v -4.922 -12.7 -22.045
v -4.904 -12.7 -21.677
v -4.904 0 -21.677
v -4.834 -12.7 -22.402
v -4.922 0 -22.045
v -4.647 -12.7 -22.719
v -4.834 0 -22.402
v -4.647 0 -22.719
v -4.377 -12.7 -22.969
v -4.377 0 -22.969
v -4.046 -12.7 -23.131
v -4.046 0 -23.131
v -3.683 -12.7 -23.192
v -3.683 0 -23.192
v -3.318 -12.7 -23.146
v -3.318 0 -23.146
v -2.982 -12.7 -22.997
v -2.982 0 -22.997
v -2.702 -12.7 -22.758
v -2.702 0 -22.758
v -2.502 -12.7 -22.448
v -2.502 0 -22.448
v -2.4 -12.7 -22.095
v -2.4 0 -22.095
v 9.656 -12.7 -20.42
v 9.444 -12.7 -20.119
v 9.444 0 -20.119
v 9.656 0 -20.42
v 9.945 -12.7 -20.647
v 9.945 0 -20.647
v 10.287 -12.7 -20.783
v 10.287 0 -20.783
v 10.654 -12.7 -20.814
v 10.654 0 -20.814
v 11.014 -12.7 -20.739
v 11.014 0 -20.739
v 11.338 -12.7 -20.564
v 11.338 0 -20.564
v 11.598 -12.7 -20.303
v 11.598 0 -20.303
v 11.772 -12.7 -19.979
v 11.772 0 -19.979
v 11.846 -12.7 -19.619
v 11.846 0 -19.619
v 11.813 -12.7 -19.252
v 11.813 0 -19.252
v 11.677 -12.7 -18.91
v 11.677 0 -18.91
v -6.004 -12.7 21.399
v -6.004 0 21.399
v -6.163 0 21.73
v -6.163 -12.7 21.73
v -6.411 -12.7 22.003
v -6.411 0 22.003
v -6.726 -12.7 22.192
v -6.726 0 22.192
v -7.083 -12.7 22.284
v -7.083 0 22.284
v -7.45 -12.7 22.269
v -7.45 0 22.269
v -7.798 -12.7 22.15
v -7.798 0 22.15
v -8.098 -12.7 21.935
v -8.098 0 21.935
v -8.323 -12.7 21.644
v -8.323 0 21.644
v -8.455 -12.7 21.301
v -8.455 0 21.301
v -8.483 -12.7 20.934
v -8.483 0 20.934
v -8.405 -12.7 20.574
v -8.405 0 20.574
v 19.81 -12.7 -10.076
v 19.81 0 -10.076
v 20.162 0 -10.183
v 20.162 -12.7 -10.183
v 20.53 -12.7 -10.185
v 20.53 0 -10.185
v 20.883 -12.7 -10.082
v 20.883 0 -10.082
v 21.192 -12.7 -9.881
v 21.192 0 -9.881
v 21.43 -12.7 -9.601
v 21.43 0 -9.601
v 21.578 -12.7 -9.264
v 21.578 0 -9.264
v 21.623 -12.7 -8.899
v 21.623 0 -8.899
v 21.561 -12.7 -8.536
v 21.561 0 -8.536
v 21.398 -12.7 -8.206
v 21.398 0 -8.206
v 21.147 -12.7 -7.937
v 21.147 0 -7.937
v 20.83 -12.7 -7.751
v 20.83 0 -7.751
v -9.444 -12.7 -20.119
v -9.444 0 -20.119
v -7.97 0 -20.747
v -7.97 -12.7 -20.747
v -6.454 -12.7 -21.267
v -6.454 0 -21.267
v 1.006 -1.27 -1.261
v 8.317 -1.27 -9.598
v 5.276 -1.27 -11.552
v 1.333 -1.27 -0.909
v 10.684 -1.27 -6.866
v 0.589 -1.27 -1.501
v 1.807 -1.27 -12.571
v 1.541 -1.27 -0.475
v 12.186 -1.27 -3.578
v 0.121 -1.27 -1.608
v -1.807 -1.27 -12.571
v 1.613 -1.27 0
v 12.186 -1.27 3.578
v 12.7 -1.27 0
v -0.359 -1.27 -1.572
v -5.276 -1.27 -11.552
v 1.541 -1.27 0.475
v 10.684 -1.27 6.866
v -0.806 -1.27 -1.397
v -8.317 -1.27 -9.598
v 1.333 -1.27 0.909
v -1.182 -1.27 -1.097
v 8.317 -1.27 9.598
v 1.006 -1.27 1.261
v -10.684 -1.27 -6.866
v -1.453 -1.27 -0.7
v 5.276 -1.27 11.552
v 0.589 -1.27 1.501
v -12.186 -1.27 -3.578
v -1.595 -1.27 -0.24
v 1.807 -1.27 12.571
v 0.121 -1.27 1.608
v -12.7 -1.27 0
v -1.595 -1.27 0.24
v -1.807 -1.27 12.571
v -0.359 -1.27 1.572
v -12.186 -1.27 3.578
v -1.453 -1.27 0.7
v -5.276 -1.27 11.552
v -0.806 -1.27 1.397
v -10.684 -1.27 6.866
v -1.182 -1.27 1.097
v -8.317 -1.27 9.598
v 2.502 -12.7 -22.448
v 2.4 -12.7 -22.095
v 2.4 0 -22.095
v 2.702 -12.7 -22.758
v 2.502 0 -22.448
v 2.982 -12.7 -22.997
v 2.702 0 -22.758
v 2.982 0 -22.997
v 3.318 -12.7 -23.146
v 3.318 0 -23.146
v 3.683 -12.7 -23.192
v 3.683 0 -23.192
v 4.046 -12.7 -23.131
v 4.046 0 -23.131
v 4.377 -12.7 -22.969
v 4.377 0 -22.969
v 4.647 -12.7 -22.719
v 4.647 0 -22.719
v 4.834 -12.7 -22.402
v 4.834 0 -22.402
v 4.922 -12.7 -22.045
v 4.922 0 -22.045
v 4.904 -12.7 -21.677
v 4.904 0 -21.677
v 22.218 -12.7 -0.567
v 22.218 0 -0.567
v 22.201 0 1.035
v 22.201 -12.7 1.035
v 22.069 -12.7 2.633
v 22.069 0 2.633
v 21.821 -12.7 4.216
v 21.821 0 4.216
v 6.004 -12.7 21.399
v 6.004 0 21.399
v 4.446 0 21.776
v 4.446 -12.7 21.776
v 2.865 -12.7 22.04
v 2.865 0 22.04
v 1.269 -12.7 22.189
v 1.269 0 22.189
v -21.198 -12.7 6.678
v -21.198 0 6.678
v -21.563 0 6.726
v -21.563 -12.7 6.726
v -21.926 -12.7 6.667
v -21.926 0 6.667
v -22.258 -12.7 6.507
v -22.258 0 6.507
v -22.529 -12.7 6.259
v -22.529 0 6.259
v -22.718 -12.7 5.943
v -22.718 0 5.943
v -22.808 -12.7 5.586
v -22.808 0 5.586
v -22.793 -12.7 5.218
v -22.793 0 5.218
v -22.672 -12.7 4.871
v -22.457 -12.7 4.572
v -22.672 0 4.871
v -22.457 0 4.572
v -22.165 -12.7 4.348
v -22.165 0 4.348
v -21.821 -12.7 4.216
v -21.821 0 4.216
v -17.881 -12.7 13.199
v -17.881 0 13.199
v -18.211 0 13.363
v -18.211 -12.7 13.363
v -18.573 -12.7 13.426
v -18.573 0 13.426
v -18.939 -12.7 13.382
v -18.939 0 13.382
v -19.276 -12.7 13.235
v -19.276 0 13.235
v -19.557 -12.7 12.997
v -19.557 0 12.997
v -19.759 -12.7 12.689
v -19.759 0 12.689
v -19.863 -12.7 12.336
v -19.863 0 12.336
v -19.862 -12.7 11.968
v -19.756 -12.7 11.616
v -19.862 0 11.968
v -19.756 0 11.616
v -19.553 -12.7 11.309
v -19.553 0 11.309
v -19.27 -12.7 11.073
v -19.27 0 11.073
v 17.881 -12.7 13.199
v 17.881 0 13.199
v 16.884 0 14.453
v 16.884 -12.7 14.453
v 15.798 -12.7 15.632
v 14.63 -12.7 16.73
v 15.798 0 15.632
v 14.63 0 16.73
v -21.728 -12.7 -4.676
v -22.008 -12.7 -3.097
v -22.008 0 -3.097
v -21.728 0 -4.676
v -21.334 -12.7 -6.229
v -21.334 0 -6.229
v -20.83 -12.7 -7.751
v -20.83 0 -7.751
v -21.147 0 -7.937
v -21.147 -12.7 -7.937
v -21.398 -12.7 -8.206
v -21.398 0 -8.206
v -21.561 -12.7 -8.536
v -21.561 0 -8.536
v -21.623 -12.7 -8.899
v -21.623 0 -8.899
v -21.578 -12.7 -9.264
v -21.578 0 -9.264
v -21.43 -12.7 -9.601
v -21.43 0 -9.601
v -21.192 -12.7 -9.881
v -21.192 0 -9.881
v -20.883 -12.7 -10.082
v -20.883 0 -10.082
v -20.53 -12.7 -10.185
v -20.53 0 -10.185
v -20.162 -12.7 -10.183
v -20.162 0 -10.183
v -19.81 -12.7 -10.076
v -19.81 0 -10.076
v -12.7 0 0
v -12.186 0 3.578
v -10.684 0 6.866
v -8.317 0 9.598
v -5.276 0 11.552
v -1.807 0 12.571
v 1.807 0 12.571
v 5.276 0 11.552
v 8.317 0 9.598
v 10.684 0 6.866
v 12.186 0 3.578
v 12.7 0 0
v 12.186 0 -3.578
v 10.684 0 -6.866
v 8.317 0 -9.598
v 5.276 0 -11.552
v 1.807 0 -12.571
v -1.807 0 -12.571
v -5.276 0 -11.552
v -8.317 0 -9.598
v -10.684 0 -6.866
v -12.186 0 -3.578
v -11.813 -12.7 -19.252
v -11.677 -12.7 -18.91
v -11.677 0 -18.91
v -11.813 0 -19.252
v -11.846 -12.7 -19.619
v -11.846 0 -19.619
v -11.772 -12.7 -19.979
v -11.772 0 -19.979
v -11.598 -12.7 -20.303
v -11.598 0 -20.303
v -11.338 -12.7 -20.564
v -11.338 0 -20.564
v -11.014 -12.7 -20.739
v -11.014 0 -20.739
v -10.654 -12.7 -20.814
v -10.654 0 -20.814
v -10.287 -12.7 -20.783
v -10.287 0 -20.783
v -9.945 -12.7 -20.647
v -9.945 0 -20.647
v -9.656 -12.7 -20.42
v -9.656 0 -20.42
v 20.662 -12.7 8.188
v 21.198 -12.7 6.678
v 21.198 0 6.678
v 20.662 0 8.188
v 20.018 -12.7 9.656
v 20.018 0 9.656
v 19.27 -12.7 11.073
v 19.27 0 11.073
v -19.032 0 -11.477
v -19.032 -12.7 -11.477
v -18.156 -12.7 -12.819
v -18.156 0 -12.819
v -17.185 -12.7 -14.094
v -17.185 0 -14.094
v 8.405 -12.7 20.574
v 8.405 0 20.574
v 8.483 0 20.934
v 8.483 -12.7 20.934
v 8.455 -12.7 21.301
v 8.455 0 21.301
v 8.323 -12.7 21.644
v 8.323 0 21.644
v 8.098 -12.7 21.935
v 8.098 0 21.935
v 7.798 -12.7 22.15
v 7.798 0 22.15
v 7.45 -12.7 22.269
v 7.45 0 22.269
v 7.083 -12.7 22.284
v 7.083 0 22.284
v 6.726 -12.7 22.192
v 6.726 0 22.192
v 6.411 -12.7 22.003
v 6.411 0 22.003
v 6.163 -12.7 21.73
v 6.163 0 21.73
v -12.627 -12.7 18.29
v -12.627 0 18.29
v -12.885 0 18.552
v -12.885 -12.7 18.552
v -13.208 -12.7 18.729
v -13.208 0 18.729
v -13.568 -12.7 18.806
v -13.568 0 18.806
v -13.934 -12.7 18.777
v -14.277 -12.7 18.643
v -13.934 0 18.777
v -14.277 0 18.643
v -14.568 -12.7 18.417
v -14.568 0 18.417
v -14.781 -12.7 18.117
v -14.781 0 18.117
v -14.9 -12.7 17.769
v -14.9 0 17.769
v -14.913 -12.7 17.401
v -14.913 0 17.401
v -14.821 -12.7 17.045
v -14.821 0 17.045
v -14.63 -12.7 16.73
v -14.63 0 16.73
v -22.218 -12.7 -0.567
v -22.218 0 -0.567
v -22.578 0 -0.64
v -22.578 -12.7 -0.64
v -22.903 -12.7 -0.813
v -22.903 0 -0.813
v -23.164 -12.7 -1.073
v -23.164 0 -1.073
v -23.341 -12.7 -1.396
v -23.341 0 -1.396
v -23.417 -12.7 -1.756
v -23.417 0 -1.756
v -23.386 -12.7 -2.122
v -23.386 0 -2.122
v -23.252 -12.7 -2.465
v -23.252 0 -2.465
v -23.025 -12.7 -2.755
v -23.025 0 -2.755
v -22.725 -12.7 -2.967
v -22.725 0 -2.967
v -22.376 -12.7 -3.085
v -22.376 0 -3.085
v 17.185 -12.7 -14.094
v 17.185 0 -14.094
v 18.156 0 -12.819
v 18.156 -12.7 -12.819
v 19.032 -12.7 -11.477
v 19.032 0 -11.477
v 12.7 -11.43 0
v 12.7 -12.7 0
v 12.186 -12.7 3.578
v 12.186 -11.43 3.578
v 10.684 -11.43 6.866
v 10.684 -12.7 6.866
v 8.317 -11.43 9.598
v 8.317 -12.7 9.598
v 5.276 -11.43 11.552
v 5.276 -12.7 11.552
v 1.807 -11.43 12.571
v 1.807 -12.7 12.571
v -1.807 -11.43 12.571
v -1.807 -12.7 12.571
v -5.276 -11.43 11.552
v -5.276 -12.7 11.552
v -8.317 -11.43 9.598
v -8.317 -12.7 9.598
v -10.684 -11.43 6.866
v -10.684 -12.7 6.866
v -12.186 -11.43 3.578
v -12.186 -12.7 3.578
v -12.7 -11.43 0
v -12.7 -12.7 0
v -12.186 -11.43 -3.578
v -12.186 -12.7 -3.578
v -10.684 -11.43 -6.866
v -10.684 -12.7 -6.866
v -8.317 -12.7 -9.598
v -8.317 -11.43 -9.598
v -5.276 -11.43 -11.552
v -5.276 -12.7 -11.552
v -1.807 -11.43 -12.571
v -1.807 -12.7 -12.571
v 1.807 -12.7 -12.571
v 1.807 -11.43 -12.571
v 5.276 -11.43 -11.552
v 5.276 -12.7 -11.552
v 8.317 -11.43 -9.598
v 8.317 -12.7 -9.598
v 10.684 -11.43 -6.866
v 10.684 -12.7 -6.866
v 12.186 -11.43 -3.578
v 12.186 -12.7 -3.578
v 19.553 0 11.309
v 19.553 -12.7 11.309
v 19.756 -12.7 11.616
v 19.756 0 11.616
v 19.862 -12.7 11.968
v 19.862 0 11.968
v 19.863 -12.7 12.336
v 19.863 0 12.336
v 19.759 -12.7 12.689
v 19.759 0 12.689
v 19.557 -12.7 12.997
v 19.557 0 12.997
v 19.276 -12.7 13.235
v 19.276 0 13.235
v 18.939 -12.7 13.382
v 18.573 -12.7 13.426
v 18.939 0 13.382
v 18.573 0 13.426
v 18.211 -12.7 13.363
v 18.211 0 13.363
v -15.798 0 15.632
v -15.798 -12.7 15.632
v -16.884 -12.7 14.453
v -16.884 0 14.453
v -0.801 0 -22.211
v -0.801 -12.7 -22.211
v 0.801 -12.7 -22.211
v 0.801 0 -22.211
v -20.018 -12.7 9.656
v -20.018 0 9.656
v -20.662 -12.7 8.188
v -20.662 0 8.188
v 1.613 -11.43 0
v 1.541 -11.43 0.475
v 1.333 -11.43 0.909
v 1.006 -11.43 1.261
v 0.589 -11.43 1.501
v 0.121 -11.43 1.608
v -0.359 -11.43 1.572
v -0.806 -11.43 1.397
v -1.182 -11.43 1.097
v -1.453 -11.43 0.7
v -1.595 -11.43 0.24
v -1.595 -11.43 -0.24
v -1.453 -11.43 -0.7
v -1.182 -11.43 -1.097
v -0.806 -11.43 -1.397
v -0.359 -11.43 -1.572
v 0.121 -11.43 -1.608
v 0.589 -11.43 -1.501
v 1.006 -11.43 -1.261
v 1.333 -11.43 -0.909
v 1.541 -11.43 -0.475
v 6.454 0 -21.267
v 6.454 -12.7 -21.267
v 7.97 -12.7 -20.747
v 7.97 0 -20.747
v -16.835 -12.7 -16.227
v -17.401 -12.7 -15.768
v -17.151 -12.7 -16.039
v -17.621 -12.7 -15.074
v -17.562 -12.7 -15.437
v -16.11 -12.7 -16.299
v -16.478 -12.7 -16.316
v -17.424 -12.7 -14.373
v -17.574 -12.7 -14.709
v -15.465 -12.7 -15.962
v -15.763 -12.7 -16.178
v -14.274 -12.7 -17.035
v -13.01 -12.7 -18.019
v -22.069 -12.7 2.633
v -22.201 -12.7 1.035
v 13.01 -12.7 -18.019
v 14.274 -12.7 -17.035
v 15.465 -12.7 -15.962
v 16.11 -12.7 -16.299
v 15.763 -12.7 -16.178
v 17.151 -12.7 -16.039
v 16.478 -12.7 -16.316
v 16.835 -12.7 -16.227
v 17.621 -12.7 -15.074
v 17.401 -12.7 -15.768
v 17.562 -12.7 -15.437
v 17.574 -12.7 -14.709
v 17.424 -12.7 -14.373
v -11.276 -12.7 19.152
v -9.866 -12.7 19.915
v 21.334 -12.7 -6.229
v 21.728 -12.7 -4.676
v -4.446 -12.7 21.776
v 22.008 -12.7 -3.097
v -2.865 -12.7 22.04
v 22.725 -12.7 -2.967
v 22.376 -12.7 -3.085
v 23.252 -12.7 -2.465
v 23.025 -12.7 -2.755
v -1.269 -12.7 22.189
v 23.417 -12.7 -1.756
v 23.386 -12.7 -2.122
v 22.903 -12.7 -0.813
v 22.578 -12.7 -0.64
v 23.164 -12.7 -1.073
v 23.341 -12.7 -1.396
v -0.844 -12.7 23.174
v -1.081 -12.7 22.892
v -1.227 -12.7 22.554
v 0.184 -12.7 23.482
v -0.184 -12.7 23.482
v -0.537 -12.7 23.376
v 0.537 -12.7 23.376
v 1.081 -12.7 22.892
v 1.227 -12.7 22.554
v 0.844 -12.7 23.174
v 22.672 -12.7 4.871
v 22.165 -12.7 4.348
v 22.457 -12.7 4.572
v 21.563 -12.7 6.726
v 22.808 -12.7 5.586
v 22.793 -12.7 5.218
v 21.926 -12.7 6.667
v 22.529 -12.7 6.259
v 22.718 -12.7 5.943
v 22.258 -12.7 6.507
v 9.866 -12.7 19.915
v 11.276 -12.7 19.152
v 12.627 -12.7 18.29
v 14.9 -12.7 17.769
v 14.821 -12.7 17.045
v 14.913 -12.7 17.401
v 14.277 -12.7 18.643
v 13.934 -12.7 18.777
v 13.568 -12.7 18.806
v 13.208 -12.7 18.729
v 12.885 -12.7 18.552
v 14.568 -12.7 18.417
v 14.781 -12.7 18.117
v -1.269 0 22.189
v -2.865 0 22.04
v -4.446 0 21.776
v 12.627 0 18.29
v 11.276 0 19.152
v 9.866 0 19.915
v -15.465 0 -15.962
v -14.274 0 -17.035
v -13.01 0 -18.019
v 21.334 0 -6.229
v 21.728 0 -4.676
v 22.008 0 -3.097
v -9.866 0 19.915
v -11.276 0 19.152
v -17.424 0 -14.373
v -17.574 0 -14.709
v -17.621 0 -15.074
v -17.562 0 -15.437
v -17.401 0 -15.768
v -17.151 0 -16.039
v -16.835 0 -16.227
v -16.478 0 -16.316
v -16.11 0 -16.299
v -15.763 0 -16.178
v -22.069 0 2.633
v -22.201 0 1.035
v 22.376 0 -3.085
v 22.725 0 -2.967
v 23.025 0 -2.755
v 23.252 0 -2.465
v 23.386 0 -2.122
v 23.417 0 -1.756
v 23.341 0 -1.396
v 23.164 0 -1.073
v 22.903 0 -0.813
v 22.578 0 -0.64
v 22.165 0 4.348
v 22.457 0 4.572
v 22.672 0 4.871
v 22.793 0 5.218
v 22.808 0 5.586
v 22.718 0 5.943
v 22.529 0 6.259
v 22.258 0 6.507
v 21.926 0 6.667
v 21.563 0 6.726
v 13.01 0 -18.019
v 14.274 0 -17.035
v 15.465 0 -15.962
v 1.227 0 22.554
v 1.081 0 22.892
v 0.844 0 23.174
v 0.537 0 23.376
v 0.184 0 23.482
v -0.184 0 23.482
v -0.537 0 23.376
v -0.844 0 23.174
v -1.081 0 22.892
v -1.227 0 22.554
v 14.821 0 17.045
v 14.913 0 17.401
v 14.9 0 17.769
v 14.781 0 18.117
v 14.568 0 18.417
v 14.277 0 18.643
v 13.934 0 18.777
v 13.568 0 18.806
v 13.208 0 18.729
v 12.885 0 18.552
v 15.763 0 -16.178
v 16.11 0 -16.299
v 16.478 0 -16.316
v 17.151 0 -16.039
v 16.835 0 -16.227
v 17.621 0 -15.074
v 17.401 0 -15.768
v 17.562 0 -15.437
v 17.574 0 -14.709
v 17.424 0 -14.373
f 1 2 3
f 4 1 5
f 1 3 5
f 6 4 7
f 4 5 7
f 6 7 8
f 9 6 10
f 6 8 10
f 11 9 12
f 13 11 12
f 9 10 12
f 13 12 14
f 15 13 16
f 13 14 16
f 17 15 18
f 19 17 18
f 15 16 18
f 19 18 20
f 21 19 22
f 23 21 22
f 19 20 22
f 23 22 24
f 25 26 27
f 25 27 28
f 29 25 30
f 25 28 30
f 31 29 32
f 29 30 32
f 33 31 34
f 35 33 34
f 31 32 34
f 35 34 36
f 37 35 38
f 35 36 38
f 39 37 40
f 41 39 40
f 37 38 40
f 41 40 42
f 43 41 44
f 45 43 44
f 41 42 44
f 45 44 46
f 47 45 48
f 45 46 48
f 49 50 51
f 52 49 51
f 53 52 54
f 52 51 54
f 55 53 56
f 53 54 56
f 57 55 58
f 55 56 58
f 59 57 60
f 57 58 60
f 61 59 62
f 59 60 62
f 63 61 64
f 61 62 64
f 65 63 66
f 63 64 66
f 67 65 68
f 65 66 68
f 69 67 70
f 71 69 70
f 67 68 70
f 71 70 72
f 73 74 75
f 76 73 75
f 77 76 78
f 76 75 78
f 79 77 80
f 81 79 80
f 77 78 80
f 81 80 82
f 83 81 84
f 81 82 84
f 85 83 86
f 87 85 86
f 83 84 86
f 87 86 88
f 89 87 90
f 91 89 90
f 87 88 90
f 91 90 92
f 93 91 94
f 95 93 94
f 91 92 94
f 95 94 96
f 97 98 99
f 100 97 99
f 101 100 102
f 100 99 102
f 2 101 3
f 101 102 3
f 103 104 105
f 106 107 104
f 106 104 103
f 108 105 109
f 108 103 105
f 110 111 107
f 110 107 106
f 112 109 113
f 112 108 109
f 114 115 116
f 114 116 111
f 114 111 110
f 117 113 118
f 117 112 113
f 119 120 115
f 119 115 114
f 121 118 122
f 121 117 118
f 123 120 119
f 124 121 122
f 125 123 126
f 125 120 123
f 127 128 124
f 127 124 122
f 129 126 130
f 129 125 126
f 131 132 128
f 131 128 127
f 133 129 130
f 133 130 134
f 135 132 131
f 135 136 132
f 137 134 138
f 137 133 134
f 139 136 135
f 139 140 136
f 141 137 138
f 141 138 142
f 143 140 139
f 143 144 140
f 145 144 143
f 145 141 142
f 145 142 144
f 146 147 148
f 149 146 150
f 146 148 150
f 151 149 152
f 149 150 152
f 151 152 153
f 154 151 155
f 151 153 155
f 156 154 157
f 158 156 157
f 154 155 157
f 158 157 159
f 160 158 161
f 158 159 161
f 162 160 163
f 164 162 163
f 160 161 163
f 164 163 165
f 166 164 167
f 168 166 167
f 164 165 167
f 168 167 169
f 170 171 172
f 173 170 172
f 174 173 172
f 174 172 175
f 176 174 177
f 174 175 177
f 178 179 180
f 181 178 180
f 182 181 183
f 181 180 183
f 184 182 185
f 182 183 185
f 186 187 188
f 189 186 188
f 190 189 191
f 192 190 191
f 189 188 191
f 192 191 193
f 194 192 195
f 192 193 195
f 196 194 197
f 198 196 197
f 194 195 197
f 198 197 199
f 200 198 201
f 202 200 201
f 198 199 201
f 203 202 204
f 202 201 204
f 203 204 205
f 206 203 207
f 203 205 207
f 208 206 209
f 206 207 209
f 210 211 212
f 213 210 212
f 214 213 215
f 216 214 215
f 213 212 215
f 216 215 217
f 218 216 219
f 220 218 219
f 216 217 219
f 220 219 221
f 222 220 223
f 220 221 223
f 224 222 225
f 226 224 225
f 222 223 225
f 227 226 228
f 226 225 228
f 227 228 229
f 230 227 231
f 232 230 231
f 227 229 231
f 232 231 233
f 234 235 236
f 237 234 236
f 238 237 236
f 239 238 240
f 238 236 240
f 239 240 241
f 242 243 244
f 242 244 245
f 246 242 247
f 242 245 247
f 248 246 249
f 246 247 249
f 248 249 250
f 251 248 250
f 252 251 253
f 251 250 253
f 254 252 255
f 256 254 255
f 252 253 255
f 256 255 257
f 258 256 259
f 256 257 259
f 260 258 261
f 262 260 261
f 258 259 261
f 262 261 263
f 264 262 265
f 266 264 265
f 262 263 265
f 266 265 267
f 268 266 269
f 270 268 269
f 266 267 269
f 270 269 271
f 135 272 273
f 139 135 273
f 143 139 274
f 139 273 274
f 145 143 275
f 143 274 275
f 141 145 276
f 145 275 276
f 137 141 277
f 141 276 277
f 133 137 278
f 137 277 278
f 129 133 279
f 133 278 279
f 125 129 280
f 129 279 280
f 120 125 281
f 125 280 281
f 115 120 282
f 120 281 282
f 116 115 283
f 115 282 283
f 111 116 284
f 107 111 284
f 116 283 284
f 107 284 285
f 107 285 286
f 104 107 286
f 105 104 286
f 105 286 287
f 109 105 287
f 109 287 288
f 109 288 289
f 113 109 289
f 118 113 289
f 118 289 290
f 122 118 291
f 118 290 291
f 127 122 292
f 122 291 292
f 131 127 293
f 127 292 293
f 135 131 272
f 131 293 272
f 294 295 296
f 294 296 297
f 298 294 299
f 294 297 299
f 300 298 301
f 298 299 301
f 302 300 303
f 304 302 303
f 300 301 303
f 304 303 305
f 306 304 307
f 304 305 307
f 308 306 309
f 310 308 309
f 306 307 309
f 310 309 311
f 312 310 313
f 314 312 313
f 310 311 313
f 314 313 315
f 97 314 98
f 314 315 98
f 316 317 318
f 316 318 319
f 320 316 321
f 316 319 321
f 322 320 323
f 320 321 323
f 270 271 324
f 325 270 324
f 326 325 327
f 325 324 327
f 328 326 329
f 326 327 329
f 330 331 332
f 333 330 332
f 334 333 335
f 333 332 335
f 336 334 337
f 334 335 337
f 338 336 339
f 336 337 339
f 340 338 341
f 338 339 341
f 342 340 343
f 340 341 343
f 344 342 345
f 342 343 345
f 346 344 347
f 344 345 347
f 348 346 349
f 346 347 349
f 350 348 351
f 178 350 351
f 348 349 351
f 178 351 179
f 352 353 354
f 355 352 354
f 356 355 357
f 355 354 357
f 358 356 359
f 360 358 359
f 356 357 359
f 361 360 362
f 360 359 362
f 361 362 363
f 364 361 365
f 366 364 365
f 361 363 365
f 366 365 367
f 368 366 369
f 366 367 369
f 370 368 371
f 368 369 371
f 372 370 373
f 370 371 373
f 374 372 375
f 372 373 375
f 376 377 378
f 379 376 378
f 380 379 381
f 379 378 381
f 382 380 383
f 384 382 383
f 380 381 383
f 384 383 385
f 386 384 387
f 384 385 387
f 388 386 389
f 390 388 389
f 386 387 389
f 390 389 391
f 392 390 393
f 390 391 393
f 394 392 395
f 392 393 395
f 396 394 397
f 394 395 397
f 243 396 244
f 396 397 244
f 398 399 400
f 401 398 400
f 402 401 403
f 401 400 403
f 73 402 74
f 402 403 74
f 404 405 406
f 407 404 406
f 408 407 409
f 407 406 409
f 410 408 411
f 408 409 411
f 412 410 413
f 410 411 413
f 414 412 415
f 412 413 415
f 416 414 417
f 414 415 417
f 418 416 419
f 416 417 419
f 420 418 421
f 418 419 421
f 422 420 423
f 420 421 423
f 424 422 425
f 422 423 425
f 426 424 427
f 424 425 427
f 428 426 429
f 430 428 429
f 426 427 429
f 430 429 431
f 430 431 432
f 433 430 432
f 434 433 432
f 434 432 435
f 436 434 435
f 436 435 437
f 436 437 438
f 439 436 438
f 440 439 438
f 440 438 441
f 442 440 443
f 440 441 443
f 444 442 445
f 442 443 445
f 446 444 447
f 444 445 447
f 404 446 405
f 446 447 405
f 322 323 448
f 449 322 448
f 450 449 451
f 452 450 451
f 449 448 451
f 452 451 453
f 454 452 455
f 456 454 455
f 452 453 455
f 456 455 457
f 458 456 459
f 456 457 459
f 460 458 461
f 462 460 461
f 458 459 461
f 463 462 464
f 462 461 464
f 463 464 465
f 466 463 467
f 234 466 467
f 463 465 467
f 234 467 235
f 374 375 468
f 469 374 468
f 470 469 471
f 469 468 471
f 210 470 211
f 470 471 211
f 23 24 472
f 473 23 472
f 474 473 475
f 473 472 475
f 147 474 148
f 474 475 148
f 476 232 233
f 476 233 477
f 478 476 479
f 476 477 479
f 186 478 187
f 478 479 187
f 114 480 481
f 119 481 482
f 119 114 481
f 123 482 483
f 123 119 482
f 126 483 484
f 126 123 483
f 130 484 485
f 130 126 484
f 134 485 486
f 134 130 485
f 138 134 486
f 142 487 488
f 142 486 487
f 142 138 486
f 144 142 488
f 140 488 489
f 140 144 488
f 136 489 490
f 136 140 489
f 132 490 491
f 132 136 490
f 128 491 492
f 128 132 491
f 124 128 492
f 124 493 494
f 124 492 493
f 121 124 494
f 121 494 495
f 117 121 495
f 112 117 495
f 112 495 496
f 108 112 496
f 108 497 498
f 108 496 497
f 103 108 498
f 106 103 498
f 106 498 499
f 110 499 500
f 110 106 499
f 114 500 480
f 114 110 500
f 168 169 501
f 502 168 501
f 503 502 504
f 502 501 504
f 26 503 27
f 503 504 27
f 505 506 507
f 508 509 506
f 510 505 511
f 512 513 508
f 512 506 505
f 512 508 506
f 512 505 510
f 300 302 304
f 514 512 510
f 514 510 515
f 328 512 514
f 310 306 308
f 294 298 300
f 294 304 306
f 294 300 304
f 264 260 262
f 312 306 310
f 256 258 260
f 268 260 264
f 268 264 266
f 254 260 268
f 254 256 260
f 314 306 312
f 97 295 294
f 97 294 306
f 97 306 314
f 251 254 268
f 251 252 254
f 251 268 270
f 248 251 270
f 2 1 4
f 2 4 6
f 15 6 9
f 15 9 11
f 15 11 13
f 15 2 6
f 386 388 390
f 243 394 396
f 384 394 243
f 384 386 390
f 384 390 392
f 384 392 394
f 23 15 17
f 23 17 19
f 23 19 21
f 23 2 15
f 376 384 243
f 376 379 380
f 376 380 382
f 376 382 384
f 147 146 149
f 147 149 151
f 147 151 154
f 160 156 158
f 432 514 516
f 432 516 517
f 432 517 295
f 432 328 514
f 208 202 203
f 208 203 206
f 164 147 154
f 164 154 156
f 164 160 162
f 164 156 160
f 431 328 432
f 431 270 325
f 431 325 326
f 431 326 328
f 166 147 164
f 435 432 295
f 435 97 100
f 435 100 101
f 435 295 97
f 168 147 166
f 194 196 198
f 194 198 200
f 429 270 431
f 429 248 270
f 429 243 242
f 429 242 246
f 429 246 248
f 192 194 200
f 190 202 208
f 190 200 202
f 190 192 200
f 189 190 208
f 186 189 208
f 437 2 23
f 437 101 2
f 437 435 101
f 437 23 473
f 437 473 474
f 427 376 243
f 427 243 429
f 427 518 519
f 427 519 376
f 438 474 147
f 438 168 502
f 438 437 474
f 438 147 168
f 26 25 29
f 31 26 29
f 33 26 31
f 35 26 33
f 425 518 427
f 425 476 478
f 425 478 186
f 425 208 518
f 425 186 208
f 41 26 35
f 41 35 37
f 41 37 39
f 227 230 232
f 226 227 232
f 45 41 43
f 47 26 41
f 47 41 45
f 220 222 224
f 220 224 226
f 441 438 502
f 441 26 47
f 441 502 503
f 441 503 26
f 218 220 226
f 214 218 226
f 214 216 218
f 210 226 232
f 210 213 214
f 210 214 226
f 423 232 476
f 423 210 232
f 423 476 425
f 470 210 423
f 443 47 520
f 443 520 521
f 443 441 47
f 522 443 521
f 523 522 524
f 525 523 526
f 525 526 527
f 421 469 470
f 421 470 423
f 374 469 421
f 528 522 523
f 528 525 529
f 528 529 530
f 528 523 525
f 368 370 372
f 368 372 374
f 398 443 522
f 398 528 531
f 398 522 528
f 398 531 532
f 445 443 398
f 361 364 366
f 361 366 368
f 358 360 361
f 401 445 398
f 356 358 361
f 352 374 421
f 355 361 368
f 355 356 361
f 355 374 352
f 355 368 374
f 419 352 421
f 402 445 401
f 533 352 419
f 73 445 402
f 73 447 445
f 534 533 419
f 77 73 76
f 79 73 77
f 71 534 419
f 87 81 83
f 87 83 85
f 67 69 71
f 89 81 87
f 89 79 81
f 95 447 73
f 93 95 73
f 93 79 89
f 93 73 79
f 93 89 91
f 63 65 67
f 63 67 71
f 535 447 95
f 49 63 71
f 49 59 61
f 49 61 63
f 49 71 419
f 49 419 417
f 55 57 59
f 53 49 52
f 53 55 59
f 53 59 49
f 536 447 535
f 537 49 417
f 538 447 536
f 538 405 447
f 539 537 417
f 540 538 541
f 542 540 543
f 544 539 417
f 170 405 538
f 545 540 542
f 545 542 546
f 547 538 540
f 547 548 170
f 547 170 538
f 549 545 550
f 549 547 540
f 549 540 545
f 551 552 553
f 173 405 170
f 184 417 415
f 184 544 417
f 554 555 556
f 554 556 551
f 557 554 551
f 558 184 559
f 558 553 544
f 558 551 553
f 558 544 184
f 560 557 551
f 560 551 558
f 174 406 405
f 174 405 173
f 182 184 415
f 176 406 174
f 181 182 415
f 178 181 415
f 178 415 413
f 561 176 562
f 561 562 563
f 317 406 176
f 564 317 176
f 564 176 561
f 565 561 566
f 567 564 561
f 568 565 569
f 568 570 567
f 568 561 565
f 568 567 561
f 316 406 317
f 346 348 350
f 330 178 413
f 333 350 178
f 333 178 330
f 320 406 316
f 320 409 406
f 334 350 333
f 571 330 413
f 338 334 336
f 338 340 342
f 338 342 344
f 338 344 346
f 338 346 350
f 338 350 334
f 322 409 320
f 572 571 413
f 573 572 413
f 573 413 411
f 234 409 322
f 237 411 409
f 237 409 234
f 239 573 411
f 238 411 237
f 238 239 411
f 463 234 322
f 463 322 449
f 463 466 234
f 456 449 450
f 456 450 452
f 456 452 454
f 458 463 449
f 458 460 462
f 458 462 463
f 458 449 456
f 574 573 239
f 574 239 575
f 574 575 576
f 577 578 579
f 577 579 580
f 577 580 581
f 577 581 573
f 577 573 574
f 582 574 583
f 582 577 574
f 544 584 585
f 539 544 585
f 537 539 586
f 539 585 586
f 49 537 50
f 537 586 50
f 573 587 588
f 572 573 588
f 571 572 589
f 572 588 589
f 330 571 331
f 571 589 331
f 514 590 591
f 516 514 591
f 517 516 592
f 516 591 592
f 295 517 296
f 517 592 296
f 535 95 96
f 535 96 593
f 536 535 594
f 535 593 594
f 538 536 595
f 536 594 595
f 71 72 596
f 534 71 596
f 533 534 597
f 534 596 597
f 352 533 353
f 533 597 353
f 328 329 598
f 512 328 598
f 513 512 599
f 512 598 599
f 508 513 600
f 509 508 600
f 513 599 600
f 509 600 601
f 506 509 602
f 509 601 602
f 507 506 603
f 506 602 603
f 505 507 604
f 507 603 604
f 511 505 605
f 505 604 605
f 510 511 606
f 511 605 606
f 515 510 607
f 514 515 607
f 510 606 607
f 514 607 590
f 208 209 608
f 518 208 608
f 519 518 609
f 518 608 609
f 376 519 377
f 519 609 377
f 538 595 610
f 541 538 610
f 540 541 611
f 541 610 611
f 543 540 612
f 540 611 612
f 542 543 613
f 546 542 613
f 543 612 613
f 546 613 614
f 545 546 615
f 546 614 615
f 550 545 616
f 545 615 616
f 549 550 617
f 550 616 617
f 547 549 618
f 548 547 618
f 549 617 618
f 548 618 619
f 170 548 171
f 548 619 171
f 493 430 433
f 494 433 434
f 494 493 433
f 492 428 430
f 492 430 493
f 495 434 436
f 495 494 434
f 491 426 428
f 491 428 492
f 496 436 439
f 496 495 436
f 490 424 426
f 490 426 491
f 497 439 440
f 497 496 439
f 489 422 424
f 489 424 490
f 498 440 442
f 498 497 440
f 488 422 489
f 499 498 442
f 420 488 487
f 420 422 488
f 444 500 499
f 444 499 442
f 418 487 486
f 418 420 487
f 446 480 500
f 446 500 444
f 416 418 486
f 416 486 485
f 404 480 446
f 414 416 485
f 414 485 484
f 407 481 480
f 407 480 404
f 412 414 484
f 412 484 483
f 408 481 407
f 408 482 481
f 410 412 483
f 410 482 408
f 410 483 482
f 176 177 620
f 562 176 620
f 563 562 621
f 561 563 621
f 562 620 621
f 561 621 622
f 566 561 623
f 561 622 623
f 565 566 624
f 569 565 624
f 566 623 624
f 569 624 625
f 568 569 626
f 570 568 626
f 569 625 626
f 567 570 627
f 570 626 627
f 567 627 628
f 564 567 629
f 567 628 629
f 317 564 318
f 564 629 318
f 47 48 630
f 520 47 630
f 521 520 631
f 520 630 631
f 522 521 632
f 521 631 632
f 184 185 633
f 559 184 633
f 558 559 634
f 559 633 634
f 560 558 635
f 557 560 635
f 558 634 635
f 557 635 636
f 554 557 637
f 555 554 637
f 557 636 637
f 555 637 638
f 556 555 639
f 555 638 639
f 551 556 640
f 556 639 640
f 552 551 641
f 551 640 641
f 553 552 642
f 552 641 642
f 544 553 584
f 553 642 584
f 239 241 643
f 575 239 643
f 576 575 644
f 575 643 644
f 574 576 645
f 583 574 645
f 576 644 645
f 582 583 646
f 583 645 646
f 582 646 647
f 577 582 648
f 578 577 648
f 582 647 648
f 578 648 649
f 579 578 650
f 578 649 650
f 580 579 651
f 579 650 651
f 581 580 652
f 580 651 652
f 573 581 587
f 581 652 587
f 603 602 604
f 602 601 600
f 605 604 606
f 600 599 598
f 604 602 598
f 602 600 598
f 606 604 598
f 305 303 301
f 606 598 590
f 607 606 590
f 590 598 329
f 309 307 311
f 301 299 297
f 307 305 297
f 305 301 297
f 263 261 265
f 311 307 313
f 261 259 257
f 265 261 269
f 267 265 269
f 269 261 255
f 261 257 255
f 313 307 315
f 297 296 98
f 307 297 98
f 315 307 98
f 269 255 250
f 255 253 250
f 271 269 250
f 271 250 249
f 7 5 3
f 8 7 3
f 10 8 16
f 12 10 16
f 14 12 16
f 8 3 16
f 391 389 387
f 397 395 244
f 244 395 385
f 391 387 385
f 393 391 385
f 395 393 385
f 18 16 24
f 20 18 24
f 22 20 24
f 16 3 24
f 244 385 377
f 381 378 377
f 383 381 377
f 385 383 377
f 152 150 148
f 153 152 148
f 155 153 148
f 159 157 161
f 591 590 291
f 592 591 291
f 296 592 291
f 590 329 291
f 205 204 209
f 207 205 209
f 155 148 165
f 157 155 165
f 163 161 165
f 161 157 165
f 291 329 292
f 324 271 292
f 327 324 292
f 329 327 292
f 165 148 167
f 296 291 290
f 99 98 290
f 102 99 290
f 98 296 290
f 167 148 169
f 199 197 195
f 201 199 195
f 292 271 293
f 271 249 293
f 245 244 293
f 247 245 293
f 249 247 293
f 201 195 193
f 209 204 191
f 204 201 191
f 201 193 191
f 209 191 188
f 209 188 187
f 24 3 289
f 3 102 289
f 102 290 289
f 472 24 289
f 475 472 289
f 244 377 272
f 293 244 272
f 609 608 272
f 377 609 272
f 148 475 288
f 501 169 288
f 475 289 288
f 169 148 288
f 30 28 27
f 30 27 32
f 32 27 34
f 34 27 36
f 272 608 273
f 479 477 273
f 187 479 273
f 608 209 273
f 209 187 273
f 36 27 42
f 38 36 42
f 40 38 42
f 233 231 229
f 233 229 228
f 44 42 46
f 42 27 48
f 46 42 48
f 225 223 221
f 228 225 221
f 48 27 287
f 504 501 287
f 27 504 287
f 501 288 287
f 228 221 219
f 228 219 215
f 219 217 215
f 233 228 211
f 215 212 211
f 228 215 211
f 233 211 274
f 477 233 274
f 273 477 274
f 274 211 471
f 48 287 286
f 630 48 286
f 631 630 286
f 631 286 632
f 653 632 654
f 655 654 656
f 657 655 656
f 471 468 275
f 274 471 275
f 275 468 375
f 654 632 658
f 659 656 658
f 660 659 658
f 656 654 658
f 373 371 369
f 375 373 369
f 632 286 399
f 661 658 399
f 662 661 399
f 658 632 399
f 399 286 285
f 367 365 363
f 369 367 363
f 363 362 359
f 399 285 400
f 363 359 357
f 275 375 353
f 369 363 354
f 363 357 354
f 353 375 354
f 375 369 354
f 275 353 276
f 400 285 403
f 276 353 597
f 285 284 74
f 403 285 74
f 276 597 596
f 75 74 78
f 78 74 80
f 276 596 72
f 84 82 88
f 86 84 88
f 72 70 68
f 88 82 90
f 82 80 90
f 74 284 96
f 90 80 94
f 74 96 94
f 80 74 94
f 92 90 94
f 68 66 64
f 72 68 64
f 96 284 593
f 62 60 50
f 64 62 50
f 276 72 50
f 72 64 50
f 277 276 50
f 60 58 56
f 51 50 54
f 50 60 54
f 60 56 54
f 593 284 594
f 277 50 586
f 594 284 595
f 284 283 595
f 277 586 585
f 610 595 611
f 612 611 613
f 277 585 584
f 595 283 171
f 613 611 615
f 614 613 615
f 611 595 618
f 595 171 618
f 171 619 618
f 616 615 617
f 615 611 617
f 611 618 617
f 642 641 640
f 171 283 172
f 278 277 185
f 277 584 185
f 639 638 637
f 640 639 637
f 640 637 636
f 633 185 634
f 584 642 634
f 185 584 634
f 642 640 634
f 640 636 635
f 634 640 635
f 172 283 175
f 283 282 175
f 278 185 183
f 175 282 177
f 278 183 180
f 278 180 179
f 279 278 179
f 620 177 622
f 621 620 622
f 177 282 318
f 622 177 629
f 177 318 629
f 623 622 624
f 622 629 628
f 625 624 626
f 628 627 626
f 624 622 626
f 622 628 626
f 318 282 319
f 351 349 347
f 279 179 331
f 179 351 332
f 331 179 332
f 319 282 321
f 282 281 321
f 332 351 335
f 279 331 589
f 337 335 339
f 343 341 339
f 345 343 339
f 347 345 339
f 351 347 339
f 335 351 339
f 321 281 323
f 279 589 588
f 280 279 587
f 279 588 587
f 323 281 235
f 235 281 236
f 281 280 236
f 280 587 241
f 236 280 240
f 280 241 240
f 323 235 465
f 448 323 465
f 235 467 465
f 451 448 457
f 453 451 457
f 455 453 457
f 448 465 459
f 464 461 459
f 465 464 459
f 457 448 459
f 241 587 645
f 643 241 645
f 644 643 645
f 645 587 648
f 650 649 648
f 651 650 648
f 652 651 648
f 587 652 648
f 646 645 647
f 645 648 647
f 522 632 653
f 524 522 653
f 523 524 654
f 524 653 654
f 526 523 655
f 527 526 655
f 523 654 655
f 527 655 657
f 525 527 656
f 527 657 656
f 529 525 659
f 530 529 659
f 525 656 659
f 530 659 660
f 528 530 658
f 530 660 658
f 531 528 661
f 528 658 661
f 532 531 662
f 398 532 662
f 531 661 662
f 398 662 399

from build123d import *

# Parameters (mm, degrees)
F0_R     = 16.51
F0_R_2   = 1.6129
F1_DEPTH = 12.7
F3_R     = 12.7
F3_R_2   = 1.6129
F2_R     = 12.7
F2_R_2   = 1.6129
F4_DEPTH = 1.27
F5_DEPTH = 1.27


# Not quite as in the source:
# - the program builds the solid bodies; features that only make, move or delete a surface that nothing else refers to are left out


with BuildPart() as f1:
    # F0 (on Front) → F1 (new body)
    with BuildSketch(Plane.XZ):
        with BuildLine():
            ThreePointArc((1.2694815268, 22.1887142857), (0, 23.495), (-1.2694815268, 22.1887142857))
            ThreePointArc((-1.2694815268, 22.1887142857), (-3.658114769, 21.9218799681), (-6.0039662348, 21.3986685205))
            ThreePointArc((-6.0039662348, 21.3986685205), (-7.628814029, 22.2219760938), (-8.405361267, 20.5742685647))
            ThreePointArc((-8.405361267, 20.5742685647), (-10.5779308102, 19.5463041206), (-12.6267910938, 18.2897449866))
            ThreePointArc((-12.6267910938, 18.2897449866), (-13.6508775395, 17.5386478213), (-14.6303896913, 16.730281602))
            ThreePointArc((-14.6303896913, 16.730281602), (-16.3514639147, 15.0525829294), (-17.8813072129, 13.1988437887))
            ThreePointArc((-17.8813072129, 13.1988437887), (-18.6060249794, 12.1559228143), (-19.2699883786, 11.0733090306))
            ThreePointArc((-19.2699883786, 11.0733090306), (-20.3530621849, 8.9276808129), (-21.1981062384, 6.6776430652))
            ThreePointArc((-21.1981062384, 6.6776430652), (-21.5449209105, 5.4559149517), (-21.8213848205, 4.2163716058))
            ThreePointArc((-21.8213848205, 4.2163716058), (-22.1490903571, 1.8353259531), (-22.2177615305, -0.5671838988))
            ThreePointArc((-22.2177615305, -0.5671838988), (-22.1490903571, -1.8353259531), (-22.0080956233, -3.0974751064))
            ThreePointArc((-22.0080956233, -3.0974751064), (-21.5449209105, -5.4559149517), (-20.8297776166, -7.7505476866))
            ThreePointArc((-20.8297776166, -7.7505476866), (-20.3530621849, -8.9276808129), (-19.8098877746, -10.0756623284))
            ThreePointArc((-19.8098877746, -10.0756623284), (-18.6060249794, -12.1559228143), (-17.1845640907, -14.0940193703))
            ThreePointArc((-17.1845640907, -14.0940193703), (-16.3514639147, -15.0525829294), (-15.4649712035, -15.9619951972))
            ThreePointArc((-15.4649712035, -15.9619951972), (-13.6508775395, -17.5386478213), (-11.6771363996, -18.9101853641))
            ThreePointArc((-11.6771363996, -18.9101853641), (-10.5779308102, -19.5463041206), (-9.4441850386, -20.1185982105))
            ThreePointArc((-9.4441850386, -20.1185982105), (-7.2164457031, -21.0207881968), (-4.9043097902, -21.6771393519))
            ThreePointArc((-4.9043097902, -21.6771393519), (-3.658114769, -21.9218799681), (-2.3999748833, -22.0950389355))
            ThreePointArc((-2.3999748833, -22.0950389355), (0, -22.225), (2.3999748833, -22.0950389355))
            ThreePointArc((2.3999748833, -22.0950389355), (3.658114769, -21.9218799681), (4.9043097902, -21.6771393519))
            ThreePointArc((4.9043097902, -21.6771393519), (7.2164457031, -21.0207881968), (9.4441850386, -20.1185982105))
            ThreePointArc((9.4441850386, -20.1185982105), (10.5779308102, -19.5463041206), (11.6771363996, -18.9101853641))
            ThreePointArc((11.6771363996, -18.9101853641), (13.6508775395, -17.5386478213), (15.4649712035, -15.9619951972))
            ThreePointArc((15.4649712035, -15.9619951972), (16.3514639147, -15.0525829294), (17.1845640907, -14.0940193703))
            ThreePointArc((17.1845640907, -14.0940193703), (18.6060249794, -12.1559228143), (19.8098877746, -10.0756623284))
            ThreePointArc((19.8098877746, -10.0756623284), (20.3530621849, -8.9276808129), (20.8297776166, -7.7505476866))
            ThreePointArc((20.8297776166, -7.7505476866), (21.5449209105, -5.4559149517), (22.0080956233, -3.0974751064))
            ThreePointArc((22.0080956233, -3.0974751064), (22.1490903571, -1.8353259531), (22.2177615305, -0.5671838988))
            ThreePointArc((22.2177615305, -0.5671838988), (22.1490903571, 1.8353259531), (21.8213848205, 4.2163716058))
            ThreePointArc((21.8213848205, 4.2163716058), (21.5449209105, 5.4559149517), (21.1981062384, 6.6776430652))
            ThreePointArc((21.1981062384, 6.6776430652), (20.3530621849, 8.9276808129), (19.2699883786, 11.0733090306))
            ThreePointArc((19.2699883786, 11.0733090306), (18.6060249794, 12.1559228143), (17.8813072129, 13.1988437887))
            ThreePointArc((17.8813072129, 13.1988437887), (16.3514639147, 15.0525829294), (14.6303896913, 16.730281602))
            ThreePointArc((14.6303896913, 16.730281602), (13.6508775395, 17.5386478213), (12.6267910938, 18.2897449866))
            ThreePointArc((12.6267910938, 18.2897449866), (10.5779308102, 19.5463041206), (8.405361267, 20.5742685647))
            ThreePointArc((8.405361267, 20.5742685647), (7.628814029, 22.2219760938), (6.0039662348, 21.3986685205))
            ThreePointArc((6.0039662348, 21.3986685205), (3.658114769, 21.9218799681), (1.2694815268, 22.1887142857))
        make_face()
        Circle(F0_R, mode=Mode.SUBTRACT)
        Circle(F0_R)
        Circle(F0_R_2, mode=Mode.SUBTRACT)
        with BuildLine():
            ThreePointArc((-19.2699883786, 11.0733090306), (-18.6060249794, 12.1559228143), (-17.8813072129, 13.1988437887))
            ThreePointArc((-17.8813072129, 13.1988437887), (-19.6692264068, 12.8505469751), (-19.2699883786, 11.0733090306))
        make_face()
        with BuildLine():
            ThreePointArc((-14.6303896913, 16.730281602), (-13.6508775395, 17.5386478213), (-12.6267910938, 18.2897449866))
            ThreePointArc((-12.6267910938, 18.2897449866), (-14.4309276846, 18.5408562683), (-14.6303896913, 16.730281602))
        make_face()
        with BuildLine():
            ThreePointArc((14.6303896913, 16.730281602), (14.4309276846, 18.5408562683), (12.6267910938, 18.2897449866))
            ThreePointArc((12.6267910938, 18.2897449866), (13.6508775395, 17.5386478213), (14.6303896913, 16.730281602))
        make_face()
        with BuildLine():
            ThreePointArc((19.2699883786, 11.0733090306), (19.6692264068, 12.8505469751), (17.8813072129, 13.1988437887))
            ThreePointArc((17.8813072129, 13.1988437887), (18.6060249794, 12.1559228143), (19.2699883786, 11.0733090306))
        make_face()
        with BuildLine():
            ThreePointArc((21.8213848205, 4.2163716058), (22.7760592482, 5.7676815204), (21.1981062384, 6.6776430652))
            ThreePointArc((21.1981062384, 6.6776430652), (21.5449209105, 5.4559149517), (21.8213848205, 4.2163716058))
        make_face()
        with BuildLine():
            ThreePointArc((22.0080956233, -3.0974751064), (23.4147526632, -1.9402017219), (22.2177615305, -0.5671838988))
            ThreePointArc((22.2177615305, -0.5671838988), (22.1490903571, -1.8353259531), (22.0080956233, -3.0974751064))
        make_face()
        with BuildLine():
            ThreePointArc((-21.8213848205, 4.2163716058), (-21.5449209105, 5.4559149517), (-21.1981062384, 6.6776430652))
            ThreePointArc((-21.1981062384, 6.6776430652), (-22.7760592482, 5.7676815204), (-21.8213848205, 4.2163716058))
        make_face()
        with BuildLine():
            ThreePointArc((-22.0080956233, -3.0974751064), (-22.1490903571, -1.8353259531), (-22.2177615305, -0.5671838988))
            ThreePointArc((-22.2177615305, -0.5671838988), (-23.4147526632, -1.9402017219), (-22.0080956233, -3.0974751064))
        make_face()
        with BuildLine():
            ThreePointArc((-19.8098877746, -10.0756623284), (-20.3530621849, -8.9276808129), (-20.8297776166, -7.7505476866))
            ThreePointArc((-20.8297776166, -7.7505476866), (-21.5160943098, -9.4378340022), (-19.8098877746, -10.0756623284))
        make_face()
        with BuildLine():
            ThreePointArc((-15.4649712035, -15.9619951972), (-16.3514639147, -15.0525829294), (-17.1845640907, -14.0940193703))
            ThreePointArc((-17.1845640907, -14.0940193703), (-17.2858332813, -15.9127305253), (-15.4649712035, -15.9619951972))
        make_face()
        with BuildLine():
            ThreePointArc((-9.4441850386, -20.1185982105), (-10.5779308102, -19.5463041206), (-11.6771363996, -18.9101853641))
            ThreePointArc((-11.6771363996, -18.9101853641), (-11.1823839994, -20.6632357846), (-9.4441850386, -20.1185982105))
        make_face()
        with BuildLine():
            ThreePointArc((-2.3999748833, -22.0950389355), (-3.658114769, -21.9218799681), (-4.9043097902, -21.6771393519))
            ThreePointArc((-4.9043097902, -21.6771393519), (-3.8671498986, -23.1745588234), (-2.3999748833, -22.0950389355))
        make_face()
        with BuildLine():
            ThreePointArc((2.3999748833, -22.0950389355), (3.8671498986, -23.1745588234), (4.9043097902, -21.6771393519))
            ThreePointArc((4.9043097902, -21.6771393519), (3.658114769, -21.9218799681), (2.3999748833, -22.0950389355))
        make_face()
        with BuildLine():
            ThreePointArc((9.4441850386, -20.1185982105), (11.1823839994, -20.6632357846), (11.6771363996, -18.9101853641))
            ThreePointArc((11.6771363996, -18.9101853641), (10.5779308102, -19.5463041206), (9.4441850386, -20.1185982105))
        make_face()
        with BuildLine():
            ThreePointArc((15.4649712035, -15.9619951972), (17.2858332813, -15.9127305253), (17.1845640907, -14.0940193703))
            ThreePointArc((17.1845640907, -14.0940193703), (16.3514639147, -15.0525829294), (15.4649712035, -15.9619951972))
        make_face()
        with BuildLine():
            ThreePointArc((19.8098877746, -10.0756623284), (21.5160943098, -9.4378340022), (20.8297776166, -7.7505476866))
            ThreePointArc((20.8297776166, -7.7505476866), (20.3530621849, -8.9276808129), (19.8098877746, -10.0756623284))
        make_face()
    extrude(amount=F1_DEPTH)

    # F3 (on face) + F2 (on face) → F4 (cut)
    with BuildSketch(Plane(origin=(0, 0, 0), x_dir=(-1, 0, 0), z_dir=(0, 1, 0))):
        Circle(F3_R)
        Circle(F3_R_2, mode=Mode.SUBTRACT)
    with BuildSketch(Plane.XZ.offset(12.7)):
        Circle(F2_R)
        Circle(F2_R_2, mode=Mode.SUBTRACT)
    extrude(amount=-F4_DEPTH, dir=(0, 1, 0), mode=Mode.SUBTRACT)

    # F2 (on face) → F5 (cut)
    with BuildSketch(Plane.XZ.offset(12.7)):
        Circle(F2_R)
    extrude(amount=-F5_DEPTH, mode=Mode.SUBTRACT)


solid = f1.part
